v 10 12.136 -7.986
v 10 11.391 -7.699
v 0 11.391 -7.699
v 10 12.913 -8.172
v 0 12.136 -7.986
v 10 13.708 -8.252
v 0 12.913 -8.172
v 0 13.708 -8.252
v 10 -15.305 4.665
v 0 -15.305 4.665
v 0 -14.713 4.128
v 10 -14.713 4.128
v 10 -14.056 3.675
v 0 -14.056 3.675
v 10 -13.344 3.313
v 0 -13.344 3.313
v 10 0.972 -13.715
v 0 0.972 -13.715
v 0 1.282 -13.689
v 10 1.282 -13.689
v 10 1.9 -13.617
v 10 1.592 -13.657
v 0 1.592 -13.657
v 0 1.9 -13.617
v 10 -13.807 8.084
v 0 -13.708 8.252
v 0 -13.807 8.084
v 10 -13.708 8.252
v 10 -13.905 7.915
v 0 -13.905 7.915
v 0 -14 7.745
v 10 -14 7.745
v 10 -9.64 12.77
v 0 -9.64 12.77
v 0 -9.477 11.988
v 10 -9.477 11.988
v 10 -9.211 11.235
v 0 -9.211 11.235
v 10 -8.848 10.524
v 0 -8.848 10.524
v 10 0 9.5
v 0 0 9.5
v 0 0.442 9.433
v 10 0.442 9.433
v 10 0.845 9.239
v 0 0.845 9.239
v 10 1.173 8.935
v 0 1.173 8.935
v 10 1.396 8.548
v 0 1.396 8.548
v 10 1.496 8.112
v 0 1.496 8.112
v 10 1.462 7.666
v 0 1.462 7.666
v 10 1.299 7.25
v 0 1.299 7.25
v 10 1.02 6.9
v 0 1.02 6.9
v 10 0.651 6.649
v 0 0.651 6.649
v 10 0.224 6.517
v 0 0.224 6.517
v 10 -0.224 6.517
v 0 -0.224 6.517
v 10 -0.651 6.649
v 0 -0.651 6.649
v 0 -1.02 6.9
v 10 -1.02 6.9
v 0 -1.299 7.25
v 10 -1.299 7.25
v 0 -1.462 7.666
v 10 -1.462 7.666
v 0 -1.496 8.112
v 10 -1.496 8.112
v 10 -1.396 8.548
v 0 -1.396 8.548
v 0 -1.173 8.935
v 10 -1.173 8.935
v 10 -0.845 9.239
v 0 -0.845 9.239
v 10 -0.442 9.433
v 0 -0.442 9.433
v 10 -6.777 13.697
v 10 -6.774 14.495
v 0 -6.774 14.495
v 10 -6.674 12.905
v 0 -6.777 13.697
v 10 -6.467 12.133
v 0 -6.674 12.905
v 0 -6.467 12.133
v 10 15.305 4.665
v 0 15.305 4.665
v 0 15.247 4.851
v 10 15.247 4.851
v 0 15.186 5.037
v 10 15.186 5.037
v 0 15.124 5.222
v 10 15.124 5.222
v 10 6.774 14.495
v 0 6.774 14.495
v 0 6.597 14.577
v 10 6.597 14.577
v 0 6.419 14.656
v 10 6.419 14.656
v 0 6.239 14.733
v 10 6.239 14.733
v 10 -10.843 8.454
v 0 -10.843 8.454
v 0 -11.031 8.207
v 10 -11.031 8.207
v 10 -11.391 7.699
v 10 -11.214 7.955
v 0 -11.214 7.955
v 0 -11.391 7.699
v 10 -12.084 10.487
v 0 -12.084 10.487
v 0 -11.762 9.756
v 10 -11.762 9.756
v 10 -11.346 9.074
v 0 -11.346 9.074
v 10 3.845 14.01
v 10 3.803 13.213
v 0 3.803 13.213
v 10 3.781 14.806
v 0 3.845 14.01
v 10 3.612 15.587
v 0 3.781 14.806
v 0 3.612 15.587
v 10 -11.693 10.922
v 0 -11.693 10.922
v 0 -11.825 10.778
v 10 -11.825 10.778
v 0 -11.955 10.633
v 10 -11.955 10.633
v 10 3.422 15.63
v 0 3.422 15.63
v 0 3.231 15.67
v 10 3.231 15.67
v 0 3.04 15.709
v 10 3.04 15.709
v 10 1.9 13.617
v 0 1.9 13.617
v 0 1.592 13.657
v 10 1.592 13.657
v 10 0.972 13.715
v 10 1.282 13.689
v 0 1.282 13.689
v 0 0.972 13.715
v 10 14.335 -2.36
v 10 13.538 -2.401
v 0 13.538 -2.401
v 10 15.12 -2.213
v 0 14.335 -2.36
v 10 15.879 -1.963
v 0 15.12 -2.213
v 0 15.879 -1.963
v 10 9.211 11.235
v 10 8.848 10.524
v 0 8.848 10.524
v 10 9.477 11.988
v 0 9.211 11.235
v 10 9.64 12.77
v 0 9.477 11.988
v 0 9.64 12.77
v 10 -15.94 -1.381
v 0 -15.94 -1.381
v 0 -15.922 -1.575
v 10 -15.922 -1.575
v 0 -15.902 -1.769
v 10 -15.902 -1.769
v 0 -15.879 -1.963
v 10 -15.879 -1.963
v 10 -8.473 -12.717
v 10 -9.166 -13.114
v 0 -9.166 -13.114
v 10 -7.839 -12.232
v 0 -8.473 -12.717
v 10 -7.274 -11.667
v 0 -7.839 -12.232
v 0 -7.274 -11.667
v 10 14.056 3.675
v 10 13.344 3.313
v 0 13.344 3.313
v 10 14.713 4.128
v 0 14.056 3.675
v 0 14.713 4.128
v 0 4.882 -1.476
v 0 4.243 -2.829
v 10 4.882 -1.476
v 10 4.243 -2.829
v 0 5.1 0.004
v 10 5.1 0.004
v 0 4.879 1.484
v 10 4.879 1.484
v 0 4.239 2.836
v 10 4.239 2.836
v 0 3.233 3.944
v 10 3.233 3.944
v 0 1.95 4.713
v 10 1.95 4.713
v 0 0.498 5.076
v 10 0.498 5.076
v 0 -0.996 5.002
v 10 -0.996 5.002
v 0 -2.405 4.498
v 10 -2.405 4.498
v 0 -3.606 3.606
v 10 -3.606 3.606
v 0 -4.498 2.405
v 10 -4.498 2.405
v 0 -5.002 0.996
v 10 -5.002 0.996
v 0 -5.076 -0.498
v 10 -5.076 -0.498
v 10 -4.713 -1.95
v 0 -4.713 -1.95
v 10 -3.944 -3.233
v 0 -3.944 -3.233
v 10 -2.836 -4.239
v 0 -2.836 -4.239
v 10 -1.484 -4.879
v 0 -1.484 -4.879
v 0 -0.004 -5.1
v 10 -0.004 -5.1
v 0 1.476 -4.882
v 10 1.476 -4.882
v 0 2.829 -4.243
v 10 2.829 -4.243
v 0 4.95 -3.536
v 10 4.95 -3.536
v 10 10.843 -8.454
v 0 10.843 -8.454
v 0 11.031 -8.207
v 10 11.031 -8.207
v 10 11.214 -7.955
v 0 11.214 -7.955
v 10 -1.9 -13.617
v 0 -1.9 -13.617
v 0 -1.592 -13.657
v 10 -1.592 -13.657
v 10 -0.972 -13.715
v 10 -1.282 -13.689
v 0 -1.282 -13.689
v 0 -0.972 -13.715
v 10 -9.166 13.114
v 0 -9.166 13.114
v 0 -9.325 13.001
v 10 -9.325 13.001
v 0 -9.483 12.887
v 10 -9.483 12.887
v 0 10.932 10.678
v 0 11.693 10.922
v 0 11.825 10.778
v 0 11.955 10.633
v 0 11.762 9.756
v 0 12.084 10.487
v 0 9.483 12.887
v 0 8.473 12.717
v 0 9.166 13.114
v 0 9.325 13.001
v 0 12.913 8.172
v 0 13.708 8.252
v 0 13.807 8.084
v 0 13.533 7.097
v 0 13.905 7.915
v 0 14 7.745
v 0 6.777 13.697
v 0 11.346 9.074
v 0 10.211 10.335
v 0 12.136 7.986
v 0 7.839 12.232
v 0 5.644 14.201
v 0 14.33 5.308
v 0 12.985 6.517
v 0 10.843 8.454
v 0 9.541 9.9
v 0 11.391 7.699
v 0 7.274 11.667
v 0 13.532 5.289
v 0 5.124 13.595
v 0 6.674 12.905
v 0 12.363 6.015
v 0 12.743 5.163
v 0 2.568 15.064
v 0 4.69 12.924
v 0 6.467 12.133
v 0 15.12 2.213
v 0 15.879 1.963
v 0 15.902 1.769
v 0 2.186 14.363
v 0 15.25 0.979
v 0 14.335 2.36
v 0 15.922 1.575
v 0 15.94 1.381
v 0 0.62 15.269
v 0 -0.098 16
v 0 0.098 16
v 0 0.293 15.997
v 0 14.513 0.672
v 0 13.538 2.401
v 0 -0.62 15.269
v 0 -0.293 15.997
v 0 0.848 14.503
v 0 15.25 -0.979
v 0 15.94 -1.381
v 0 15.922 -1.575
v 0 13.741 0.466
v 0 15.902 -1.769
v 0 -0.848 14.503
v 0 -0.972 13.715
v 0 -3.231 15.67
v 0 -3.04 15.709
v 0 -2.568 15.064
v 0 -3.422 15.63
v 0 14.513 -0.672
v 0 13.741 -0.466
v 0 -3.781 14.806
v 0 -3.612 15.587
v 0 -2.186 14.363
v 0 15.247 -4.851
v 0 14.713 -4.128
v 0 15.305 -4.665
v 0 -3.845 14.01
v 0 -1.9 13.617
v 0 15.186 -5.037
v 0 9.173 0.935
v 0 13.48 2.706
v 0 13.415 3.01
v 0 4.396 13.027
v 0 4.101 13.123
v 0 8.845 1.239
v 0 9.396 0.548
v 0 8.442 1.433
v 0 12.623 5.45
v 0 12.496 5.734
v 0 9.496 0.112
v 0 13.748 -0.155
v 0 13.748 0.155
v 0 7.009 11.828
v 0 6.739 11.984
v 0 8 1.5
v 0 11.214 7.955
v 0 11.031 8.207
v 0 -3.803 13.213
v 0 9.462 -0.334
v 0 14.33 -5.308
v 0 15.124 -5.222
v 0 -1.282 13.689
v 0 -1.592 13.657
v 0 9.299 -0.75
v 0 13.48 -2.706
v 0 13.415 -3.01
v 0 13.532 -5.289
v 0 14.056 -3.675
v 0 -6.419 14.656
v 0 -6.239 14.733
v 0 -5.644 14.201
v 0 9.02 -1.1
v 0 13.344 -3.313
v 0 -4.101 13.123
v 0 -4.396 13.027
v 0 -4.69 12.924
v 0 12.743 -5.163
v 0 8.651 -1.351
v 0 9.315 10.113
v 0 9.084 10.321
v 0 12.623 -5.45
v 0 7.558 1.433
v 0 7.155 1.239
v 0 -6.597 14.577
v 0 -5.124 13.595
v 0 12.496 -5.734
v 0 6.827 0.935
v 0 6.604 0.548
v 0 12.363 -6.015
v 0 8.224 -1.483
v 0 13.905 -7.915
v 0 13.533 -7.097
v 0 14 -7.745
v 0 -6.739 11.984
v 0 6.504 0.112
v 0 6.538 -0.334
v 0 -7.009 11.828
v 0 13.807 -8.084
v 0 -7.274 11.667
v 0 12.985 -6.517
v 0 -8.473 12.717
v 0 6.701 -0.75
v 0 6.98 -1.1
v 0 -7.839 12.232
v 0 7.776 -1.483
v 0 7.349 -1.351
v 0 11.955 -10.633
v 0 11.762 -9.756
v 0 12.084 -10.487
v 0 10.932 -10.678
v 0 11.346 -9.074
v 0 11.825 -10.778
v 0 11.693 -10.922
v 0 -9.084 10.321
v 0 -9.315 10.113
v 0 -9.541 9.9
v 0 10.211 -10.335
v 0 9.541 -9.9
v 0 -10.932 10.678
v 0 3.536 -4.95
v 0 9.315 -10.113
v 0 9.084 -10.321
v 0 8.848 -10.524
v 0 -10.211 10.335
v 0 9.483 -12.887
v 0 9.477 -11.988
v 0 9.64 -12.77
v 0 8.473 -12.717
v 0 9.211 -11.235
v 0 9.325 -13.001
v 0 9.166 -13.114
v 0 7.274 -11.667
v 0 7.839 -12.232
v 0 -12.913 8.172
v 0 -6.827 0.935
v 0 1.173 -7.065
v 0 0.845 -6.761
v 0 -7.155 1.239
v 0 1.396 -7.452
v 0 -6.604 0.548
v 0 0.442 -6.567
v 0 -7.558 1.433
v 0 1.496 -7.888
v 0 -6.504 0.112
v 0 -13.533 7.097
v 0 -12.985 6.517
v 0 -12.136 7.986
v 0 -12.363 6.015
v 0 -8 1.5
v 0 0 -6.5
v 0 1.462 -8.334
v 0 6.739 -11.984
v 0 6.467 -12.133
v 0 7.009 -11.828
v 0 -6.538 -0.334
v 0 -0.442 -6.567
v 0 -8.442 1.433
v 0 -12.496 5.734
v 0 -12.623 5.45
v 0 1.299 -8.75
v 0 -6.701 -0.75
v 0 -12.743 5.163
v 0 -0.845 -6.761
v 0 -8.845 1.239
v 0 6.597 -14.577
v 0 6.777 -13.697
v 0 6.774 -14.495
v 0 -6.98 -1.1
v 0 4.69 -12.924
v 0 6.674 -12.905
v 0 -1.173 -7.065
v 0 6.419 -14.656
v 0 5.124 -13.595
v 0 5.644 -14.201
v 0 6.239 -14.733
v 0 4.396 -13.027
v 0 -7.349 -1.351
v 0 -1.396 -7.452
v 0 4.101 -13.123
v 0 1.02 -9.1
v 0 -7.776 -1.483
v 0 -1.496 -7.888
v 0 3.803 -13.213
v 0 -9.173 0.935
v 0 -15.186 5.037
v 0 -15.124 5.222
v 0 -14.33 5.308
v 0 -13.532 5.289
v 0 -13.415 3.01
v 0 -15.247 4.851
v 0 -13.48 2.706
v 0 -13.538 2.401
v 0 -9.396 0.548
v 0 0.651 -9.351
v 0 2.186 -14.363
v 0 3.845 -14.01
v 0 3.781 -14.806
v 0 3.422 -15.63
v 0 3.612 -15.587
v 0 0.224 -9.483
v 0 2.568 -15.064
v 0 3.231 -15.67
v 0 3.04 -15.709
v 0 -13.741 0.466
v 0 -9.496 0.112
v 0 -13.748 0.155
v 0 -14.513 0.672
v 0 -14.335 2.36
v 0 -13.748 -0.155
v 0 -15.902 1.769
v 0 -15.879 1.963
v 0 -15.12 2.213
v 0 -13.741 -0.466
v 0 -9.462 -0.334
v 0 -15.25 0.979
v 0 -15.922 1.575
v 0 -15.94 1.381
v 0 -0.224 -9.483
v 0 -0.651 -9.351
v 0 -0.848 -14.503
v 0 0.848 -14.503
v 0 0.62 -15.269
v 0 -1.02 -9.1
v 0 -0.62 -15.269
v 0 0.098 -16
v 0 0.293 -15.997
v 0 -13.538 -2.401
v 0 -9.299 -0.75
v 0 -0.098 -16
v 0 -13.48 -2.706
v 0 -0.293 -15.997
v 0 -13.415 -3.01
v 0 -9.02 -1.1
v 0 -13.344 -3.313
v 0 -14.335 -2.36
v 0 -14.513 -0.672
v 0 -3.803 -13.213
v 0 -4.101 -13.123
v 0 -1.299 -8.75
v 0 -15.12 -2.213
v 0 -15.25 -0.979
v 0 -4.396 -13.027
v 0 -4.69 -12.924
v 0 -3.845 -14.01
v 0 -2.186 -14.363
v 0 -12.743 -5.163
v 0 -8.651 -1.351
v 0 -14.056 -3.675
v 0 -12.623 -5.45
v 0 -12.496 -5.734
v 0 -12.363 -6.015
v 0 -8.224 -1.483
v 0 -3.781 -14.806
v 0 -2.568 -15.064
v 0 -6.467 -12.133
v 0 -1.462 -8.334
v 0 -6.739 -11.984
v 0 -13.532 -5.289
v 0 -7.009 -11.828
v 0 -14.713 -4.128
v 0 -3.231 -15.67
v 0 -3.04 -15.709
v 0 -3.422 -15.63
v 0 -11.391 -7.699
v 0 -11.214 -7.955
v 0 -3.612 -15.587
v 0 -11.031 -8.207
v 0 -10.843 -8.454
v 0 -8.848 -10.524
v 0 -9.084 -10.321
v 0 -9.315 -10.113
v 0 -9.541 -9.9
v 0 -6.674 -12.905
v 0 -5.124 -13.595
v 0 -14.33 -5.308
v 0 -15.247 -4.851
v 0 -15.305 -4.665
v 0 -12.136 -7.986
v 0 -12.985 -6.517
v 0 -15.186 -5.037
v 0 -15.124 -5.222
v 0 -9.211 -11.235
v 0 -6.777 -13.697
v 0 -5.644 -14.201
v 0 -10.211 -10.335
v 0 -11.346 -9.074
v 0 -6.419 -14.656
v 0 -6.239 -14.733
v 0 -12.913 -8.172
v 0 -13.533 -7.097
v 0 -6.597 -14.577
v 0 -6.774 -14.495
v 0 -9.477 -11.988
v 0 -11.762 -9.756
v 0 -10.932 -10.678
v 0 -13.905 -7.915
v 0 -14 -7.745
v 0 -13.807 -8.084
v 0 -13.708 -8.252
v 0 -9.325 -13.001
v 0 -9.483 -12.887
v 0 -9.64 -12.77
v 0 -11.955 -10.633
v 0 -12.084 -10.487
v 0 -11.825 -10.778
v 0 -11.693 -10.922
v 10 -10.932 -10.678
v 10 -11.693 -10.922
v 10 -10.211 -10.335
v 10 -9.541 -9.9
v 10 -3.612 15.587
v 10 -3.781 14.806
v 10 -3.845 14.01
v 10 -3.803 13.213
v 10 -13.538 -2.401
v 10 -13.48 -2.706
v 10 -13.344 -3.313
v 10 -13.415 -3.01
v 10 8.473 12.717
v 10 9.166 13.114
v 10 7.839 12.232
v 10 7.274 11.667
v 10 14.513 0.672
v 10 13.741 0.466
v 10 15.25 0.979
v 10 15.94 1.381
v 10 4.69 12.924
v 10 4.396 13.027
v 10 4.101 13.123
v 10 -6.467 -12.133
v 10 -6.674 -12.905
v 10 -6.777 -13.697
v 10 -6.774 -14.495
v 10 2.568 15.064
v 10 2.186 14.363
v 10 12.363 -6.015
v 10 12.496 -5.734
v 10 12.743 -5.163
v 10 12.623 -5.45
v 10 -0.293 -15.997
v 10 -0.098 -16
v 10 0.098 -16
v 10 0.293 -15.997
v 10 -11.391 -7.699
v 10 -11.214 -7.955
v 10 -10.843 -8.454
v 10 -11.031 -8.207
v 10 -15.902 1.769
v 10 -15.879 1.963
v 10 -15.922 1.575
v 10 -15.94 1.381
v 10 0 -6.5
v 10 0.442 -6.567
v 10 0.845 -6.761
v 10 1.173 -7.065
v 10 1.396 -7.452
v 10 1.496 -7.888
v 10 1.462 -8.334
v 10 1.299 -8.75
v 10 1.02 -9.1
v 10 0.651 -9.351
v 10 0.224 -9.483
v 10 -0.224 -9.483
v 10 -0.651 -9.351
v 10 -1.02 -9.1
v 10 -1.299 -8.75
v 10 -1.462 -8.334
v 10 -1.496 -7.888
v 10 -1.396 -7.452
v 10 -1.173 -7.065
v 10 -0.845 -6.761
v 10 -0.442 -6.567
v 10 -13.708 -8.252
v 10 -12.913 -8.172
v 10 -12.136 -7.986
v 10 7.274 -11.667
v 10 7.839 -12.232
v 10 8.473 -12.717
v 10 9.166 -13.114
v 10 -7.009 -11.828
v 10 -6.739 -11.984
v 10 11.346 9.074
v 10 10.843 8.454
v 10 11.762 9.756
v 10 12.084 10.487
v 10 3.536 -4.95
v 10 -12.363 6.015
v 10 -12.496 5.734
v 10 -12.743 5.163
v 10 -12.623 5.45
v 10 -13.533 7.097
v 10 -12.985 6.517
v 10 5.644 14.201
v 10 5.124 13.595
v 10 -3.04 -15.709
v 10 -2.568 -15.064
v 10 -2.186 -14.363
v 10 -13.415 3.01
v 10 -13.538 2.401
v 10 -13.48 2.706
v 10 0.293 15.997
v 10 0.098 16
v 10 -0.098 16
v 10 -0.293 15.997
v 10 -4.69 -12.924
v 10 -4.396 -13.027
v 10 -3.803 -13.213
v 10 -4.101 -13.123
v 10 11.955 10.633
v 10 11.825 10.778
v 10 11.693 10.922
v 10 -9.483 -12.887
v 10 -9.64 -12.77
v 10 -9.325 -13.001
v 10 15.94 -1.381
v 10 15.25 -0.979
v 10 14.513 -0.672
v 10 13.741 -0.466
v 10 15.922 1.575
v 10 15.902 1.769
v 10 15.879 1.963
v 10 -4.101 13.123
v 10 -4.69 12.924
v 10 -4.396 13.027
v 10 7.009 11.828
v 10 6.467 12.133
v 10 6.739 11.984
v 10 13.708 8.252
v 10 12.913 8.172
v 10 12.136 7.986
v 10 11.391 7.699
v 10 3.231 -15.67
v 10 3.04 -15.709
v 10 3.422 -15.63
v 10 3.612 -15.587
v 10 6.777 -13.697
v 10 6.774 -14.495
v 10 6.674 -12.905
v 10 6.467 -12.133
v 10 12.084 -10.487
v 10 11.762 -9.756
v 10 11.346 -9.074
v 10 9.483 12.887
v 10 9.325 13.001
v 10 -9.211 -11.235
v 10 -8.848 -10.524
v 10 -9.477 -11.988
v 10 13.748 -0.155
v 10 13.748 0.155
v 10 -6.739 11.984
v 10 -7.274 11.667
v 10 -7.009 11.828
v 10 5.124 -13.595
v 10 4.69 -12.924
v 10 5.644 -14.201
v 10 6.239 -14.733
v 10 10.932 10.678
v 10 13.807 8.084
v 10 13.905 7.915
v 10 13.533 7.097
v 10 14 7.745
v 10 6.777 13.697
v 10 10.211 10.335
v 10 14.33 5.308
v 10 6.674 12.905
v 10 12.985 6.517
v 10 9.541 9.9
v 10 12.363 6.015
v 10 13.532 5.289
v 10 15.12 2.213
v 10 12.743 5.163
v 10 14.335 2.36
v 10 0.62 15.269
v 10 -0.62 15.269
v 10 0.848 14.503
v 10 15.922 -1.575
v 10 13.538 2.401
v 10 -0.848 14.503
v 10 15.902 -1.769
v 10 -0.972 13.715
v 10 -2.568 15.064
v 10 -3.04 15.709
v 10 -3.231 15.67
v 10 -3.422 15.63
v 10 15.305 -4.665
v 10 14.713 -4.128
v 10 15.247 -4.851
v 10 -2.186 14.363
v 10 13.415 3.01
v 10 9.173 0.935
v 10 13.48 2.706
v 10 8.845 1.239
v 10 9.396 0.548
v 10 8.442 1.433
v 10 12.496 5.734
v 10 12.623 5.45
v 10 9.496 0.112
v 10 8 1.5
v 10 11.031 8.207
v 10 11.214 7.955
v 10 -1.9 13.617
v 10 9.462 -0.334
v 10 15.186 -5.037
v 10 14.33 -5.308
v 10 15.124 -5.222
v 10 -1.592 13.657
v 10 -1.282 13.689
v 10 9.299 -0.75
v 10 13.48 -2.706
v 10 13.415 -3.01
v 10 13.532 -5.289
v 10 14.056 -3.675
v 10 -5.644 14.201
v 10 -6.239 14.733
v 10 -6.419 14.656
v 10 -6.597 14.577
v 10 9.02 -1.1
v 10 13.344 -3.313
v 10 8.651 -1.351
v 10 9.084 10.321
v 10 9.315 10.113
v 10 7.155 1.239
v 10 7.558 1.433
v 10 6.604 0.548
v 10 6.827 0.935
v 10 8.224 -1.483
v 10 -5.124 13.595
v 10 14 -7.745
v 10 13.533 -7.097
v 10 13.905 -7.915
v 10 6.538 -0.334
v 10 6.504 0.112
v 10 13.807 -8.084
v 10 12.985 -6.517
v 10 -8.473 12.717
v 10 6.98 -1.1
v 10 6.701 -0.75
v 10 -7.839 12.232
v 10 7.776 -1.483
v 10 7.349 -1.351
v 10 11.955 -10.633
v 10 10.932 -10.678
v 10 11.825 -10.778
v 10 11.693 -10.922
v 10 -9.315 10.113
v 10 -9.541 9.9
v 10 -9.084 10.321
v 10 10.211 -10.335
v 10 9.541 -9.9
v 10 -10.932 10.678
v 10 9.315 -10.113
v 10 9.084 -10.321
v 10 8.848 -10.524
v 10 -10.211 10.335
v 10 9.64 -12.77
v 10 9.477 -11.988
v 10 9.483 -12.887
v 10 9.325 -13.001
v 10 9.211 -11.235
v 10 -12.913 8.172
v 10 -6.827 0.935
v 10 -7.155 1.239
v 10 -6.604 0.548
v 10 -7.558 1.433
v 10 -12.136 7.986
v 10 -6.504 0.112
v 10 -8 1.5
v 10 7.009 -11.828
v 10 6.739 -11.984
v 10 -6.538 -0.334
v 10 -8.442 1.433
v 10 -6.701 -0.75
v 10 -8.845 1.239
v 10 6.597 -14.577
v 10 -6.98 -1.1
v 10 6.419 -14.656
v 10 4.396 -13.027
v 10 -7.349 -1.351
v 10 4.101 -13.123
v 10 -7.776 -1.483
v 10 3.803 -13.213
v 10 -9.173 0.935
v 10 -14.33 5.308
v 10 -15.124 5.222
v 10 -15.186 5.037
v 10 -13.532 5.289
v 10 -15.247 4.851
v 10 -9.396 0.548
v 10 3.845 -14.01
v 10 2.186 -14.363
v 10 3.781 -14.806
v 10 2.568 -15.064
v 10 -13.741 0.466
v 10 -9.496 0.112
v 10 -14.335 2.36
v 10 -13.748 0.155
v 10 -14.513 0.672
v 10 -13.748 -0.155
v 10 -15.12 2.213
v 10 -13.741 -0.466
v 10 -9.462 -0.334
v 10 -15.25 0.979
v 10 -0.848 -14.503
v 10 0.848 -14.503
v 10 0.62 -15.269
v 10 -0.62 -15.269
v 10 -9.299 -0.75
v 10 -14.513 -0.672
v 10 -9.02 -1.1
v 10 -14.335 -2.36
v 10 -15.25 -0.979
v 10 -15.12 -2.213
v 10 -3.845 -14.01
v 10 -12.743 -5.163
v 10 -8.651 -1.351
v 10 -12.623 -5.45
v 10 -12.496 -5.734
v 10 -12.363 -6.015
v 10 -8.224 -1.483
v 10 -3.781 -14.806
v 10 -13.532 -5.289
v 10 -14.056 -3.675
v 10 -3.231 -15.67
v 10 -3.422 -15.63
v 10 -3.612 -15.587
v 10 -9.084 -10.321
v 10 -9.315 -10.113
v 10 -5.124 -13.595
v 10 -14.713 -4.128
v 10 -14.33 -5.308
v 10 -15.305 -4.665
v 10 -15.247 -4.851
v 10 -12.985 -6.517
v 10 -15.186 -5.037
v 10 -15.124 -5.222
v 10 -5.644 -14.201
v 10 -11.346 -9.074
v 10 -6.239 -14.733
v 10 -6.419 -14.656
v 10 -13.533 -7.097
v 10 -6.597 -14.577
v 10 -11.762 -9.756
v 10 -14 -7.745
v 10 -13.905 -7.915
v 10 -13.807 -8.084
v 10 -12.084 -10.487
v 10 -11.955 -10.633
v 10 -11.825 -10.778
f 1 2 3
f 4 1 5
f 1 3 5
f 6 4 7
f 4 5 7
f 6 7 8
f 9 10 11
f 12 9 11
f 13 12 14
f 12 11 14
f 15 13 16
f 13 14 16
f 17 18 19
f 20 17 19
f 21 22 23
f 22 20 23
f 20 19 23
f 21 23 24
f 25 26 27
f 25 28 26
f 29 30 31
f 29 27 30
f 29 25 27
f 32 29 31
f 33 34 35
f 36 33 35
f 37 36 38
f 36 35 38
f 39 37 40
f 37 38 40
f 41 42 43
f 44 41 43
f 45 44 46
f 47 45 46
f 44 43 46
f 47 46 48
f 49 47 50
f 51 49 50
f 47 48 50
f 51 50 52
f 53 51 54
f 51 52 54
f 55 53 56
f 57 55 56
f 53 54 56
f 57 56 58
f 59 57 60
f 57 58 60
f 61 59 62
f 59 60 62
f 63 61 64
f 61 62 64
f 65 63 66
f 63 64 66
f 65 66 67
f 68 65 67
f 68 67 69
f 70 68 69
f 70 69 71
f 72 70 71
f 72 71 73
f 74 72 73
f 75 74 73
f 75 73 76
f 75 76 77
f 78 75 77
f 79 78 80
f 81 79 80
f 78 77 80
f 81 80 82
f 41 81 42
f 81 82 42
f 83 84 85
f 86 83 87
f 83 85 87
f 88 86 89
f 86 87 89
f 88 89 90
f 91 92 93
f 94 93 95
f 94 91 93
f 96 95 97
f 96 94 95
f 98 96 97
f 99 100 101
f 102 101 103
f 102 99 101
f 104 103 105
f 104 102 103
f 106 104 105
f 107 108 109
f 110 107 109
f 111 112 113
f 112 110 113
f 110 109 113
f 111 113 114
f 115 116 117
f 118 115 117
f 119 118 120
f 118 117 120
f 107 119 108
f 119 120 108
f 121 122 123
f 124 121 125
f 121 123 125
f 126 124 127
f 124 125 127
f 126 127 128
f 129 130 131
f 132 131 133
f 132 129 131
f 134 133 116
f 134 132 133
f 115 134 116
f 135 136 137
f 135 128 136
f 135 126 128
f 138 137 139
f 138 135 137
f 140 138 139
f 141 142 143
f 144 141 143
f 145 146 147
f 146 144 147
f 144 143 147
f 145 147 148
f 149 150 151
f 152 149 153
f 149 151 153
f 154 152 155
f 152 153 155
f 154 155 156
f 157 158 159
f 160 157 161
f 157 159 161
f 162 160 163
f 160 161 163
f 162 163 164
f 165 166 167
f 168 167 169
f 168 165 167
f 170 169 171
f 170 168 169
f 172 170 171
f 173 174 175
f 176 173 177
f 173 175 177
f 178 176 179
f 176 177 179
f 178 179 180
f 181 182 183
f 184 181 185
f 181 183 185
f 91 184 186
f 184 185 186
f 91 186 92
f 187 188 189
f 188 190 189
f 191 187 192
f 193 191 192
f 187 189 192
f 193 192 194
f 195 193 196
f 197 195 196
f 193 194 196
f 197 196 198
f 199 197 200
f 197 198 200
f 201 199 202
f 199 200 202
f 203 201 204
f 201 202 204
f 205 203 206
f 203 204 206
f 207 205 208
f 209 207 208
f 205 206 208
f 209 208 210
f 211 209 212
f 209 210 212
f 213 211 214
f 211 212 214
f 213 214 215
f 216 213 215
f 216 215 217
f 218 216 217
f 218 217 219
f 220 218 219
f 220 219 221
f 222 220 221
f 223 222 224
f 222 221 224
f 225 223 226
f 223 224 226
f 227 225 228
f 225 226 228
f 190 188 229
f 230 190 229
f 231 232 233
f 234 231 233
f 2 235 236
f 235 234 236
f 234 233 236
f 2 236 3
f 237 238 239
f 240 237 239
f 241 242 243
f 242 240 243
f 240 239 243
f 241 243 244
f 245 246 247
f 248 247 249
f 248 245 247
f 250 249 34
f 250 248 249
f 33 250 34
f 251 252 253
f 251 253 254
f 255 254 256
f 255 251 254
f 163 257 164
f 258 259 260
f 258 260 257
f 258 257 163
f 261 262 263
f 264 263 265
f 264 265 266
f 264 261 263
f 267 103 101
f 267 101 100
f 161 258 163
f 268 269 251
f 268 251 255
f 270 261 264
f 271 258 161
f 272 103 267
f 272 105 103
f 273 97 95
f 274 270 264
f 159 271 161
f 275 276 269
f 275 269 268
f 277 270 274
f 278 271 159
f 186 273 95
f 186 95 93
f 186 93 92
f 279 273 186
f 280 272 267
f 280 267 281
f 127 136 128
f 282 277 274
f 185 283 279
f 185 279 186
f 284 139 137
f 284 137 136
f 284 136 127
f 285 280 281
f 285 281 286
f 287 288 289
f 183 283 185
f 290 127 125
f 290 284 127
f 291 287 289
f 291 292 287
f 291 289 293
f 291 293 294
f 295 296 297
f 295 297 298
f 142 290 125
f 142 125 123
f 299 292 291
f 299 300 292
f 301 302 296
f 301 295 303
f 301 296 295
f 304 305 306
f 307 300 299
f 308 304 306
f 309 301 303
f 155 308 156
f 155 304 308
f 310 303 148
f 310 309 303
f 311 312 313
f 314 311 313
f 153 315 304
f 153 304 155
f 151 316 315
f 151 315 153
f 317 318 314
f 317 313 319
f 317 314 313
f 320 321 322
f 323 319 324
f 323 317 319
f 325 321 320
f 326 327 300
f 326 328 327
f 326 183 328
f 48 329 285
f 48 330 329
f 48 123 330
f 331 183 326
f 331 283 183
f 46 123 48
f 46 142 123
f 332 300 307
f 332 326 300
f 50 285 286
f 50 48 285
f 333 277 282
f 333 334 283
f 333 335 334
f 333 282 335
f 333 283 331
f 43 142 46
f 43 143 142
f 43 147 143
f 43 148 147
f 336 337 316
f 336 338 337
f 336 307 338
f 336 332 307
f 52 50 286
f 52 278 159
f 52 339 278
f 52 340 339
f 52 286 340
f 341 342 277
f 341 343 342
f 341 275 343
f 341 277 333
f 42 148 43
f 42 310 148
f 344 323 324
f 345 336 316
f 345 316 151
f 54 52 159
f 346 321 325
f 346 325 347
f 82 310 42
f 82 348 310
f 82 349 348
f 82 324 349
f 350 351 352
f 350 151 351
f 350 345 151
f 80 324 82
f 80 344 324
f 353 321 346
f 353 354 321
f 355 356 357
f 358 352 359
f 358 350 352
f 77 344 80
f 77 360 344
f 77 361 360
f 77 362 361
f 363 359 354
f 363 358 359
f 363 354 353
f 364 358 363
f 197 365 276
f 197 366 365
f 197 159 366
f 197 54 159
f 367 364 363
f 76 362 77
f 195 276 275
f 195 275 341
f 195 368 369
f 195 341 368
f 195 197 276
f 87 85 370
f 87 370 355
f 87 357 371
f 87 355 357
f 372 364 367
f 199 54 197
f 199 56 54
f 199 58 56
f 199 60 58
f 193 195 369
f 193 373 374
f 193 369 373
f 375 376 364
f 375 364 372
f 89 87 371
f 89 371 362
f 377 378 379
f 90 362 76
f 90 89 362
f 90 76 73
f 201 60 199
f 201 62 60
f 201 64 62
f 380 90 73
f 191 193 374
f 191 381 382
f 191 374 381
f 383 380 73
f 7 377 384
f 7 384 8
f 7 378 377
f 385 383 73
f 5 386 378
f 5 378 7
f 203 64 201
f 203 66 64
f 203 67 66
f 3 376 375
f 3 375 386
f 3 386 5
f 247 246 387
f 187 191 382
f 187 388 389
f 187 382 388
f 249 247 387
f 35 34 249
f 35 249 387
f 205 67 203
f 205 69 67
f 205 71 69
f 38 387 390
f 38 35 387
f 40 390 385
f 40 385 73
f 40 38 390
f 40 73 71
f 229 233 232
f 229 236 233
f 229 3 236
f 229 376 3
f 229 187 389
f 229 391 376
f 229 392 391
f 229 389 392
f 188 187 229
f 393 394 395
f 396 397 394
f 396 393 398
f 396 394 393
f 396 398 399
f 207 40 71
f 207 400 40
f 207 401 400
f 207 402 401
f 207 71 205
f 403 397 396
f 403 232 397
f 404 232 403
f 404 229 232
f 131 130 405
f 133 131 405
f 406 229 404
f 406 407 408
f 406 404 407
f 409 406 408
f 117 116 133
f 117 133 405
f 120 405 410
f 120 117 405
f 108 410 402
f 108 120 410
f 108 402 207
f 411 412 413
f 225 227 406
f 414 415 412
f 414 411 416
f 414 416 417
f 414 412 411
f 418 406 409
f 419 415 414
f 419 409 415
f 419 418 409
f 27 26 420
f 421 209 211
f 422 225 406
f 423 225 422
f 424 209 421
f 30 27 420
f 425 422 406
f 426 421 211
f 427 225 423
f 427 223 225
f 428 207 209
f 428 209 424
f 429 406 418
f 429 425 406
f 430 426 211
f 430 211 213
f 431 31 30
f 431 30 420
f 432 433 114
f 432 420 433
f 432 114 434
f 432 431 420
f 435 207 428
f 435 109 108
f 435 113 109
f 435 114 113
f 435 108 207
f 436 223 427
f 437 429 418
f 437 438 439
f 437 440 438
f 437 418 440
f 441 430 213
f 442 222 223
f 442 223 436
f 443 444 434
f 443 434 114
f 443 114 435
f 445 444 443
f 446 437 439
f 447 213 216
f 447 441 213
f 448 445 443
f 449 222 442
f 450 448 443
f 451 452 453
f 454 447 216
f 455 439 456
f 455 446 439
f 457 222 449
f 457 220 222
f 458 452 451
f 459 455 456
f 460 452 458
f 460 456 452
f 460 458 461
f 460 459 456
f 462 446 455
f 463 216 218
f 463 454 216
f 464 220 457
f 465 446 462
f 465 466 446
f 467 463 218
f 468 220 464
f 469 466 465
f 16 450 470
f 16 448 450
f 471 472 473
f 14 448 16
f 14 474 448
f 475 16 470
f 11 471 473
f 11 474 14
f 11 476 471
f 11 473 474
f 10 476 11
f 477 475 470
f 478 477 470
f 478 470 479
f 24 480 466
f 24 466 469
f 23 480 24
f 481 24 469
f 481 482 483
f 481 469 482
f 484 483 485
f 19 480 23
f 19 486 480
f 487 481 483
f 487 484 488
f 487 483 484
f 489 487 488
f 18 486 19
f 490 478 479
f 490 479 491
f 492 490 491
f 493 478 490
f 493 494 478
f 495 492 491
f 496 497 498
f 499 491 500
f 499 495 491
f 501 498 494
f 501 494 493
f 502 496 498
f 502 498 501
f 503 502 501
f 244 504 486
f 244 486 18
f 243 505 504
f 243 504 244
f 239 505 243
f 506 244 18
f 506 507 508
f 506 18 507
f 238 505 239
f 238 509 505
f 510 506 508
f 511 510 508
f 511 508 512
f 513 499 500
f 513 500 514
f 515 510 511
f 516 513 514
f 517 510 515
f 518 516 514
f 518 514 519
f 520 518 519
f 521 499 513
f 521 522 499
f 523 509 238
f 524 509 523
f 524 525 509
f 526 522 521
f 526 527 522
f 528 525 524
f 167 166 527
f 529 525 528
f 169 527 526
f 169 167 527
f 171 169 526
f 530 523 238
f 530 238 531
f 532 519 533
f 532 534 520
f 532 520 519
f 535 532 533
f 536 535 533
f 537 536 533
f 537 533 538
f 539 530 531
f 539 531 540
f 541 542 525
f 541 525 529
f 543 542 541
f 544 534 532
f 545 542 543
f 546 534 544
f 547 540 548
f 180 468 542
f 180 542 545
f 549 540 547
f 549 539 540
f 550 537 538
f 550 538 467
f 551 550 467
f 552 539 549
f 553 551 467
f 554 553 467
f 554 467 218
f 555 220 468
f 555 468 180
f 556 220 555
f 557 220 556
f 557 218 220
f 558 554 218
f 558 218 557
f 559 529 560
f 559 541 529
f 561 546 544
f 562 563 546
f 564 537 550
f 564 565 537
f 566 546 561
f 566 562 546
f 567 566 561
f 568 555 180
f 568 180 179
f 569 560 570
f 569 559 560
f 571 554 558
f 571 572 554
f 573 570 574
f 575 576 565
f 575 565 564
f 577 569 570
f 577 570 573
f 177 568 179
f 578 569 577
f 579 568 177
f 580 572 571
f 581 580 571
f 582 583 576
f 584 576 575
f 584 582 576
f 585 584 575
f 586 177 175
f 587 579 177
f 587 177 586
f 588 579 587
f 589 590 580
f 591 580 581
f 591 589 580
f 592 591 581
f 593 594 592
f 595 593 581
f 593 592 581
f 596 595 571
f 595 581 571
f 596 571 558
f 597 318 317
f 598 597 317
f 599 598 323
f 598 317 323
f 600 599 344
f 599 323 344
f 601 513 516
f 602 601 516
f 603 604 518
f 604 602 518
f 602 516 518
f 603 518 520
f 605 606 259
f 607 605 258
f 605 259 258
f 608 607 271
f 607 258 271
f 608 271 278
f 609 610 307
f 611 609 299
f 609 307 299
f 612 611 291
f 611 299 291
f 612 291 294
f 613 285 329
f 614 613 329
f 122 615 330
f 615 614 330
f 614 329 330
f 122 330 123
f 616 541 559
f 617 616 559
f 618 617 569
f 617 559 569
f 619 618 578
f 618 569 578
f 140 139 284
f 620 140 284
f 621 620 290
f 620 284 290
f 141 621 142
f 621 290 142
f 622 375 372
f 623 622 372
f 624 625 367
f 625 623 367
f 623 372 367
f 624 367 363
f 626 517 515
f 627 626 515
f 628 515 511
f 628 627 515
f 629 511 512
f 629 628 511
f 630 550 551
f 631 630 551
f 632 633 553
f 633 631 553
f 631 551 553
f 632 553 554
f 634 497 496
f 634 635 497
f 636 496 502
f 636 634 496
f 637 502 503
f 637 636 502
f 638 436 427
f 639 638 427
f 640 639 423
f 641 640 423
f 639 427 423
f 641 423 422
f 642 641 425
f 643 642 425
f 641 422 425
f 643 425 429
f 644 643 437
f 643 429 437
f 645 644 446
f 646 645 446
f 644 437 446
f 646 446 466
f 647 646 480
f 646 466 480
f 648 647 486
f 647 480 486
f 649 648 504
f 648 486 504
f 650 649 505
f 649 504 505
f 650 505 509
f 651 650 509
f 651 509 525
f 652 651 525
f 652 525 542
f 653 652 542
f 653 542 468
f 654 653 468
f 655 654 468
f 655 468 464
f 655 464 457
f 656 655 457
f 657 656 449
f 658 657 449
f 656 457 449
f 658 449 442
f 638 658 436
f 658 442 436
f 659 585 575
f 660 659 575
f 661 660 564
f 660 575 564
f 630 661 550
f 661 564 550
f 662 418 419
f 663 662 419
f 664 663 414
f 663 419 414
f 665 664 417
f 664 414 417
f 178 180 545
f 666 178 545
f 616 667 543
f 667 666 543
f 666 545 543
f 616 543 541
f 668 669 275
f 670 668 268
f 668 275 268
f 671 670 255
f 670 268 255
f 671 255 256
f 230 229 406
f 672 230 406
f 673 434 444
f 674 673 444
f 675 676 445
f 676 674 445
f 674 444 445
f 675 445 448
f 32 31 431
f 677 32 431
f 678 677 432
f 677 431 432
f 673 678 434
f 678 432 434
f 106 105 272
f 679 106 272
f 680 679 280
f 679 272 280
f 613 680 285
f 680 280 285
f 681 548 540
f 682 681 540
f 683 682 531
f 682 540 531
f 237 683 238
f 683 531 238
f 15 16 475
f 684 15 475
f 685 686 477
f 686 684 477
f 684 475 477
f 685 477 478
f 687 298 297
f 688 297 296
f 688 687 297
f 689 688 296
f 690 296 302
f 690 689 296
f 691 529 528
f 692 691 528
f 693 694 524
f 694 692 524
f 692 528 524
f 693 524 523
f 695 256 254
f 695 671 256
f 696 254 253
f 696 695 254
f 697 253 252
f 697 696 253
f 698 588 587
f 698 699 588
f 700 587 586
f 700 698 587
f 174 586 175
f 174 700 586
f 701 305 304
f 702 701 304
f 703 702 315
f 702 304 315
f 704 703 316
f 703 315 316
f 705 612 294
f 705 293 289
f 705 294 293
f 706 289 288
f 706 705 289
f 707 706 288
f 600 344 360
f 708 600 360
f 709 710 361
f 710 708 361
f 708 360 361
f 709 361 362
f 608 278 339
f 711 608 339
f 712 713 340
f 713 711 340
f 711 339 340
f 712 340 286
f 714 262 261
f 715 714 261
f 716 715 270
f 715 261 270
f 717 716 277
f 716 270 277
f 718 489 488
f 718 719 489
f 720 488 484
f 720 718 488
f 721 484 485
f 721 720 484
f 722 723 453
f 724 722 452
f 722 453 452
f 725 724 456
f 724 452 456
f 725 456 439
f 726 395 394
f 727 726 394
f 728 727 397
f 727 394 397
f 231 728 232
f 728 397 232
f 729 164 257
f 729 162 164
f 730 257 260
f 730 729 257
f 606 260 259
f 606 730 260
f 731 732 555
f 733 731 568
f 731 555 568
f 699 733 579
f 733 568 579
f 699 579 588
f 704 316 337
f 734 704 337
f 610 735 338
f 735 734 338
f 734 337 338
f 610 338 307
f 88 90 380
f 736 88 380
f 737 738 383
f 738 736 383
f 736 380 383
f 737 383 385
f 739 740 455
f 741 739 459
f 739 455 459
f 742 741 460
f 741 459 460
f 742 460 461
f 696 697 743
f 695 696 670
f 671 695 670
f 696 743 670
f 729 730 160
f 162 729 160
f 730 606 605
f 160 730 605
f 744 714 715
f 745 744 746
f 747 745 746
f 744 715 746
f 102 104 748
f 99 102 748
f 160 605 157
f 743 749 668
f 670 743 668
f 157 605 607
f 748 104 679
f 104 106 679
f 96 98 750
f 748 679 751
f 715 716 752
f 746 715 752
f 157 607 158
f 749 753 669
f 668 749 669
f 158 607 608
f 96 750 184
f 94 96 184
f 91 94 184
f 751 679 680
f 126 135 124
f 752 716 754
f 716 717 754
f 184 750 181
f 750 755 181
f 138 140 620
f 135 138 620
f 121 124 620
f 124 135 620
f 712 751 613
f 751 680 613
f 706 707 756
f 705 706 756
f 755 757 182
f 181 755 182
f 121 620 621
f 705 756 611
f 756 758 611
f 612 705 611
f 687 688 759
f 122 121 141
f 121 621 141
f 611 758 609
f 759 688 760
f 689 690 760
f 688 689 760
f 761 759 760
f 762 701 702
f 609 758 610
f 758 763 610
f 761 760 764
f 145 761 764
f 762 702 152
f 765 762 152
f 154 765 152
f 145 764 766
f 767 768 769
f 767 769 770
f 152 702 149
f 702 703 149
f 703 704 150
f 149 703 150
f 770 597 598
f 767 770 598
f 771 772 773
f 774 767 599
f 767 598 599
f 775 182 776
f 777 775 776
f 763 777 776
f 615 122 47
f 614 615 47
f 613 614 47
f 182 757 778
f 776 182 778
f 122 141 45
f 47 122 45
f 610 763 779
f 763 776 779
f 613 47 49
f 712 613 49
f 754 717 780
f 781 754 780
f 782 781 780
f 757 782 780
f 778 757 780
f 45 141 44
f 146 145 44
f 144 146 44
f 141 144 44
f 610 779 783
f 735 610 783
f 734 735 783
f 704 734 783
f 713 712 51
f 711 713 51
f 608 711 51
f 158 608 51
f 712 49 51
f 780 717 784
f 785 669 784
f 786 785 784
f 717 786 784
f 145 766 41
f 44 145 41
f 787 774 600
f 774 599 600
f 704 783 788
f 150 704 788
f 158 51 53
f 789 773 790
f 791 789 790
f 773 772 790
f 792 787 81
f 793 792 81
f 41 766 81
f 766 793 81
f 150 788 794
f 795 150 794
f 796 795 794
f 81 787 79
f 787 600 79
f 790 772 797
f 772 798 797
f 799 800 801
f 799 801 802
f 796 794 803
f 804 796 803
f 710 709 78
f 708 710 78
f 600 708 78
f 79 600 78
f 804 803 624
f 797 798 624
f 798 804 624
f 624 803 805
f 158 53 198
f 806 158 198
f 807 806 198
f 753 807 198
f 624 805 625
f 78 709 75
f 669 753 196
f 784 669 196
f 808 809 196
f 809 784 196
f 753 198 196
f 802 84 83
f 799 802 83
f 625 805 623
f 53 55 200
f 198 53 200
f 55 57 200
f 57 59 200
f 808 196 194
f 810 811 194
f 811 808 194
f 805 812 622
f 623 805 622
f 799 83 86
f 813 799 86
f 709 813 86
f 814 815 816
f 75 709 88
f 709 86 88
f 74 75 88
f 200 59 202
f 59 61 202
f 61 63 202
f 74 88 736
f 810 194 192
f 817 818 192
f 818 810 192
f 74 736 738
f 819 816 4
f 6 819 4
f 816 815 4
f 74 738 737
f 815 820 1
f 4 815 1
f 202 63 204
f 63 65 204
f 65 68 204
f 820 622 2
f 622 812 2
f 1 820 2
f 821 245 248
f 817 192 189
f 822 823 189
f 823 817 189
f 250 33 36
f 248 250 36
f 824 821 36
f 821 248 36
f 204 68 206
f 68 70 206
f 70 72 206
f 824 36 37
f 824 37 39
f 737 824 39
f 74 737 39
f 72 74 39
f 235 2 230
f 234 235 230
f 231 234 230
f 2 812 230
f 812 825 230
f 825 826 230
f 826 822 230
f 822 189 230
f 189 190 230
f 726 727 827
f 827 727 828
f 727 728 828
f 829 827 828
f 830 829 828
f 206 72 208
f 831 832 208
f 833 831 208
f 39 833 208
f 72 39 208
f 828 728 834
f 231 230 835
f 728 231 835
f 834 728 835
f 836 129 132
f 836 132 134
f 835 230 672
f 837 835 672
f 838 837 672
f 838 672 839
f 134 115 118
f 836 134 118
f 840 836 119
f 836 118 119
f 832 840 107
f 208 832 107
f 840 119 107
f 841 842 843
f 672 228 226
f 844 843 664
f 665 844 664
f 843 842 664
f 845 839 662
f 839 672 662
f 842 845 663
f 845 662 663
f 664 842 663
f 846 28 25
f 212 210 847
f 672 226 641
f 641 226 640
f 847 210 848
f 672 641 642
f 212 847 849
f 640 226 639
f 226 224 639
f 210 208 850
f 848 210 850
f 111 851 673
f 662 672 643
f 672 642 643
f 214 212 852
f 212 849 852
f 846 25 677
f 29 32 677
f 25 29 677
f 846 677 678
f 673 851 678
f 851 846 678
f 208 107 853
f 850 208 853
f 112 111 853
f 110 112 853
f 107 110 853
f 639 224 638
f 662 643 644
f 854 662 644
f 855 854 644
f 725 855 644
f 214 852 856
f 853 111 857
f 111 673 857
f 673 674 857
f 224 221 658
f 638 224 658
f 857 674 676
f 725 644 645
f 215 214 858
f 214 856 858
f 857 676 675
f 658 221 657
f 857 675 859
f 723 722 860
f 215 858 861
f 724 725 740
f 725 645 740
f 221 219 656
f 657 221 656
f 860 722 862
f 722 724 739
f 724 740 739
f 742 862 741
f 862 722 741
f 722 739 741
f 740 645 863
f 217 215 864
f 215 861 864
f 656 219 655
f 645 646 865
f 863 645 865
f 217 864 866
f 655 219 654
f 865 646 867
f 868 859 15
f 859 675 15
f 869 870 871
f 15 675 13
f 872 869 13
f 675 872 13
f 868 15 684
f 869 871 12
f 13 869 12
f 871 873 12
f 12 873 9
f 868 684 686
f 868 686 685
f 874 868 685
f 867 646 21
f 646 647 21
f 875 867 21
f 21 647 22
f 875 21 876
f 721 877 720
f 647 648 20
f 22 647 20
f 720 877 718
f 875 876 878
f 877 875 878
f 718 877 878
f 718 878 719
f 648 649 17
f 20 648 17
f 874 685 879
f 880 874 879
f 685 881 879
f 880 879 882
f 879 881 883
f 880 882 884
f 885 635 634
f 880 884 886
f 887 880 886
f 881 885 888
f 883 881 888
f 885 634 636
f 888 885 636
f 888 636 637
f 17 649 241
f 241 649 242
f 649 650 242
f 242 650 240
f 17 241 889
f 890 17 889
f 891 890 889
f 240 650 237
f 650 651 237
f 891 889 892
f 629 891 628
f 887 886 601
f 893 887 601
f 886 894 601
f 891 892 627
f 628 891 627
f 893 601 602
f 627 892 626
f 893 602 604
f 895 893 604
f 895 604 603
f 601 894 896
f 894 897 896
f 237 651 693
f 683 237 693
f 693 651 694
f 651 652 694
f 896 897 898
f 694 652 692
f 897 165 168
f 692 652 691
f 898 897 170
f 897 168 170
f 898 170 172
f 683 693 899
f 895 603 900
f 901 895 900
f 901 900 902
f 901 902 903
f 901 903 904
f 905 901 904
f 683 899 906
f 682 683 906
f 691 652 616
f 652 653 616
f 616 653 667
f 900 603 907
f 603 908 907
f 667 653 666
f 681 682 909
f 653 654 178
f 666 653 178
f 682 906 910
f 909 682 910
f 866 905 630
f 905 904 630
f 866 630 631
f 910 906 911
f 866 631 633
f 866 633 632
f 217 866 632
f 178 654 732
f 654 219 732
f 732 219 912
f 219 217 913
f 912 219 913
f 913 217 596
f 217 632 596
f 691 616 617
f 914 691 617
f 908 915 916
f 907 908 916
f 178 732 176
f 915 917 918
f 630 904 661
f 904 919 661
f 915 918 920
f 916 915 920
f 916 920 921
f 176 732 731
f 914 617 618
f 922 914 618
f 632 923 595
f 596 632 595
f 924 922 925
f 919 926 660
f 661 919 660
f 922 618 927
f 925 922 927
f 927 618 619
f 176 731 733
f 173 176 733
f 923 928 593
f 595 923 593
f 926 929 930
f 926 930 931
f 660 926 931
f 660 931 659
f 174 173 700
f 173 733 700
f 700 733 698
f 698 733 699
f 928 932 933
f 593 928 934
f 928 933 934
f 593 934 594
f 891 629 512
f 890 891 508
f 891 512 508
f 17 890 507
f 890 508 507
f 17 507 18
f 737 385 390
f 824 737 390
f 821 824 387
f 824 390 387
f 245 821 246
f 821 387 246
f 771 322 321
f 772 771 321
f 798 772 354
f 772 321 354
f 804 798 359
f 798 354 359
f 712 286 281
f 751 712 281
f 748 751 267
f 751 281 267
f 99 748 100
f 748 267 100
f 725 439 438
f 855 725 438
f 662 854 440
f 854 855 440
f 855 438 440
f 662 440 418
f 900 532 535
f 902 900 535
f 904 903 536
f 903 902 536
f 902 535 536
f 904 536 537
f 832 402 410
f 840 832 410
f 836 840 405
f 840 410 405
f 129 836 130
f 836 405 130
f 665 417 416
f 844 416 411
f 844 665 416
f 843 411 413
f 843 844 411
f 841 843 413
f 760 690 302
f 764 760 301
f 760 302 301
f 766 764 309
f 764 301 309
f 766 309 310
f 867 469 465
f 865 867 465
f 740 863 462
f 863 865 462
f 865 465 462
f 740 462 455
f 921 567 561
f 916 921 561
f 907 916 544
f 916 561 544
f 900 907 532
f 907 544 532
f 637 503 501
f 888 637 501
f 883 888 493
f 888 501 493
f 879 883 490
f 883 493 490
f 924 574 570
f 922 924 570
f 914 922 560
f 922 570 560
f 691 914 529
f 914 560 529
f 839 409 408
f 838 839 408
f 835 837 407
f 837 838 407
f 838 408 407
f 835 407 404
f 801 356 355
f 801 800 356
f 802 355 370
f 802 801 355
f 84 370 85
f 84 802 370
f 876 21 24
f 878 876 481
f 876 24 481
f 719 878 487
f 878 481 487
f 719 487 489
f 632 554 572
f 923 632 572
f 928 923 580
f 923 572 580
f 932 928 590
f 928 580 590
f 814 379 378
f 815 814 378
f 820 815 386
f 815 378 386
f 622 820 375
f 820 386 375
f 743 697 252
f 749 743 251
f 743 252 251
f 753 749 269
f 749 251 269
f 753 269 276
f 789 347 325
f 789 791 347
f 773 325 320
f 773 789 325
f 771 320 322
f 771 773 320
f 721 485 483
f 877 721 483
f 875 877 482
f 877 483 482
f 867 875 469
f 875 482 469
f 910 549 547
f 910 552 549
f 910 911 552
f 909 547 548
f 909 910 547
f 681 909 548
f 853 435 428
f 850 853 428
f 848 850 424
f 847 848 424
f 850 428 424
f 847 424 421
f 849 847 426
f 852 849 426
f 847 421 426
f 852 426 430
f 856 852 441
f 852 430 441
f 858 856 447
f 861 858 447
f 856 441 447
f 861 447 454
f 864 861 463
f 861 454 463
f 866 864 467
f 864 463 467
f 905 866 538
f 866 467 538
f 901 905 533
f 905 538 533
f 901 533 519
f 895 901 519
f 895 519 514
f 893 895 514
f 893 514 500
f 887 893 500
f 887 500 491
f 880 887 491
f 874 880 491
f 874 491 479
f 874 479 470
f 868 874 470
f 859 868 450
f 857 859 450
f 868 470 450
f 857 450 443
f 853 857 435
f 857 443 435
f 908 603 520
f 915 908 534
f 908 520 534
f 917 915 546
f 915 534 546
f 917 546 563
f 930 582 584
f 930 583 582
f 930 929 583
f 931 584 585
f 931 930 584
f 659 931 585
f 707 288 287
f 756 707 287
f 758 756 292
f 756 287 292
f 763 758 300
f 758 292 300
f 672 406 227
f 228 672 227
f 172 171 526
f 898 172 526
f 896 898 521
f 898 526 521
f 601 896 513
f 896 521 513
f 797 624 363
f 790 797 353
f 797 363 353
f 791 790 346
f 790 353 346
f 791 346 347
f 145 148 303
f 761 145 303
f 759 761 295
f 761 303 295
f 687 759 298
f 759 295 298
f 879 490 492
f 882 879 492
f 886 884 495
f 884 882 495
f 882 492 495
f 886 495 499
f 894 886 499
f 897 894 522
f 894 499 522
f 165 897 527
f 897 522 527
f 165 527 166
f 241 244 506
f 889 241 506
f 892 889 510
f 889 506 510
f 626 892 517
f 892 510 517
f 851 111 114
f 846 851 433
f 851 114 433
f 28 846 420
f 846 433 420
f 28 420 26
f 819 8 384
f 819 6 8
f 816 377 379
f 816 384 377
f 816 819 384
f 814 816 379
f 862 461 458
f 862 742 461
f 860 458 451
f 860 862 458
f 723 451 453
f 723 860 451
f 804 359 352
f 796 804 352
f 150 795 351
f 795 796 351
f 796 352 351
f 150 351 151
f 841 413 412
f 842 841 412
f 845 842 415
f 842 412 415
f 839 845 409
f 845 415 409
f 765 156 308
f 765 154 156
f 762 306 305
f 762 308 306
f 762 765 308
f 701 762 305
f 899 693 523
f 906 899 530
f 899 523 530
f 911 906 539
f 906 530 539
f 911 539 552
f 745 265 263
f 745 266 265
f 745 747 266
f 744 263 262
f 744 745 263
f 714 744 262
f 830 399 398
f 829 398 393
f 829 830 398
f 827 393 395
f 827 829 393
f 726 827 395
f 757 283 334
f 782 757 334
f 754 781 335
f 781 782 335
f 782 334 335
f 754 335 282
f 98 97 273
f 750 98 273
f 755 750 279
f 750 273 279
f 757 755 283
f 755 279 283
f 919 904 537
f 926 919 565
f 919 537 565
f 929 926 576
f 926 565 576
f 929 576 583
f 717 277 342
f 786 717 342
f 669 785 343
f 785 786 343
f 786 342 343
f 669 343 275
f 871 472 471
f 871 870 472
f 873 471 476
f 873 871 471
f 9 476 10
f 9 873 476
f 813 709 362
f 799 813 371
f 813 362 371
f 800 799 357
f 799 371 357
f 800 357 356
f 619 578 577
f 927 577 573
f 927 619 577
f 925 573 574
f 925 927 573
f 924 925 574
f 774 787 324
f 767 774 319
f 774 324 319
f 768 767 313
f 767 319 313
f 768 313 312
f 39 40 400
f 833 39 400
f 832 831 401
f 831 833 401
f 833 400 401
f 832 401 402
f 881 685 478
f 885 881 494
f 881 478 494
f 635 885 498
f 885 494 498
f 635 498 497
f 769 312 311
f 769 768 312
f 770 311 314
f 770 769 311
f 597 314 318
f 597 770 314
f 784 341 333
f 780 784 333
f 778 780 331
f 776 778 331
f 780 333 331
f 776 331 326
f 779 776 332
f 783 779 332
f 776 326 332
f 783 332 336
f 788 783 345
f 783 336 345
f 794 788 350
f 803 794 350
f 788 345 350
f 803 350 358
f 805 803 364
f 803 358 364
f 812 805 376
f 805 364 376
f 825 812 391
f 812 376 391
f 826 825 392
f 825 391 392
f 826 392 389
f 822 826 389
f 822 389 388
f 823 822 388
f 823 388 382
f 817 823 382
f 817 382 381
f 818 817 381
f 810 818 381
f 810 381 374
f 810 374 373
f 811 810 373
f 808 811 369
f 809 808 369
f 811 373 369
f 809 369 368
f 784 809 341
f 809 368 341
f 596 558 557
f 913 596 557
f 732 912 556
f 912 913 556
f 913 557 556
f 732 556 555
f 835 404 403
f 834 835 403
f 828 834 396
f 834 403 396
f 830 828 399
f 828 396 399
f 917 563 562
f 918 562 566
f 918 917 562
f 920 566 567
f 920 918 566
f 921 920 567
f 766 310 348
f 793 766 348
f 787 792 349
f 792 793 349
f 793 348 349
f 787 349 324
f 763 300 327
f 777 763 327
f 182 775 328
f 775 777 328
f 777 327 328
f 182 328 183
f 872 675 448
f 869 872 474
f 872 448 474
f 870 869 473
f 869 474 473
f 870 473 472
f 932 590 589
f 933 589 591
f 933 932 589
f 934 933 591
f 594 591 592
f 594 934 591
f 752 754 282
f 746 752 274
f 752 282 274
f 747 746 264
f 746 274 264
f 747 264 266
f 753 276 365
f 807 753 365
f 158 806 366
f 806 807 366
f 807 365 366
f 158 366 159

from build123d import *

# Parameters (mm, degrees)
BASPROSKE_W        = 10
BASPROSKE_H        = 16
TOOTHCUT_DEPTH     = 25.738633754
TEETHCUTS_COUNT    = 30
TEETHCUTS_ANGLE    = 348
HUBNEAONESKE_R     = 12.5
HUBNEARONE_DEPTH   = 8.0000508
BORSKE_R           = 3
BORE_DEPTH         = 18.0000508
SKETCH2_R          = 12.5
CUT_EXTRUDE1_DEPTH = 8.0000508
SKETCH3_R          = 5.1
CUT_EXTRUDE2_DEPTH = 10
SKETCH4_R          = 1.5
CUT_EXTRUDE3_DEPTH = 10


with BuildPart() as part:
    # BasProSke → Base-Revolve (revolve)
    with BuildSketch(Plane(origin=(0, 0, 0), x_dir=(1, 0, 0), z_dir=(0, 1, 0)), mode=Mode.PRIVATE) as base_revolve_sk:
        with Locations((5, 8)):
            Rectangle(BASPROSKE_W, BASPROSKE_H)
    revolve(base_revolve_sk.sketch.rotate(Axis((-10, 0, 0), (1, 0, 0)), 180), axis=Axis((-10, 0, 0), (1, 0, 0)))

    # TooCutSke → ToothCut (cut, through all)
    with BuildSketch(Plane(origin=(0, 0, 0), x_dir=(0, 0, -1), z_dir=(1, 0, 0))):
        with BuildLine():
            ThreePointArc((0.466400716, 13.741086979), (0, 13.749), (-0.466400716, 13.741086979))
            ThreePointArc((-0.466400716, 13.741086979), (-0.819142092, 14.899954875), (-1.3974676, 15.964351834))
            ThreePointArc((-1.3974676, 15.964351834), (0, 16.0254), (1.3974676, 15.964351834))
            ThreePointArc((1.3974676, 15.964351834), (0.819142092, 14.899954875), (0.466400716, 13.741086979))
        make_face()
    toothcut = extrude(amount=TOOTHCUT_DEPTH, mode=Mode.SUBTRACT)

    # TeethCuts: ToothCut ×30 about axis
    teethcuts_axis = Axis((-10, 0, 0), (1, 0, 0))
    for i in range(1, TEETHCUTS_COUNT):
        add(toothcut.rotate(teethcuts_axis, i * TEETHCUTS_ANGLE / (TEETHCUTS_COUNT - 1)), mode=Mode.SUBTRACT)

    # HubNeaOneSke → HubNearOne (add)
    with BuildSketch(Plane.ZY):
        with Locations(Location((0, 0, 0), (0, 0, 180))):
            Circle(HUBNEAONESKE_R)
    extrude(amount=HUBNEARONE_DEPTH)

    # BorSke → Bore (cut, symmetric)
    with BuildSketch(Plane(origin=(0, 0, 0), x_dir=(0, 0, -1), z_dir=(1, 0, 0))):
        with Locations(Location((0, 0, 0), (0, 0, 180))):
            Circle(BORSKE_R)
    extrude(amount=BORE_DEPTH, both=True, mode=Mode.SUBTRACT)

    # Sketch2 → Cut-Extrude1 (cut)
    with BuildSketch(Plane.ZY.offset(8.0000508)):
        Circle(SKETCH2_R)
    extrude(amount=-CUT_EXTRUDE1_DEPTH, mode=Mode.SUBTRACT)

    # Sketch3 → Cut-Extrude2 (cut)
    with BuildSketch(Plane(origin=(10, 0, 0), x_dir=(0, 0, -1), z_dir=(1, 0, 0))):
        Circle(SKETCH3_R)
    extrude(amount=-CUT_EXTRUDE2_DEPTH, mode=Mode.SUBTRACT)

    # Sketch4 → Cut-Extrude3 (cut)
    with BuildSketch(Plane.ZY):
        with BuildLine():
            ThreePointArc((-4.243347723, 2.829134161), (-3.606244584, 3.606244584), (-2.829134161, 4.243347723))
            Line((-2.829134161, 4.243347723), (-3.535533906, 4.949747468))
            Line((-3.535533906, 4.949747468), (-4.949747468, 3.535533906))
            Line((-4.949747468, 3.535533906), (-4.243347723, 2.829134161))
        make_face()
        with Locations((0, -8)):
            Circle(SKETCH4_R)
        with Locations((8, 0)):
            Circle(SKETCH4_R)
        with Locations((-8, 0)):
            Circle(SKETCH4_R)
        with Locations((0, 8)):
            Circle(SKETCH4_R)
    extrude(amount=-CUT_EXTRUDE3_DEPTH, mode=Mode.SUBTRACT)


solid = part.part
